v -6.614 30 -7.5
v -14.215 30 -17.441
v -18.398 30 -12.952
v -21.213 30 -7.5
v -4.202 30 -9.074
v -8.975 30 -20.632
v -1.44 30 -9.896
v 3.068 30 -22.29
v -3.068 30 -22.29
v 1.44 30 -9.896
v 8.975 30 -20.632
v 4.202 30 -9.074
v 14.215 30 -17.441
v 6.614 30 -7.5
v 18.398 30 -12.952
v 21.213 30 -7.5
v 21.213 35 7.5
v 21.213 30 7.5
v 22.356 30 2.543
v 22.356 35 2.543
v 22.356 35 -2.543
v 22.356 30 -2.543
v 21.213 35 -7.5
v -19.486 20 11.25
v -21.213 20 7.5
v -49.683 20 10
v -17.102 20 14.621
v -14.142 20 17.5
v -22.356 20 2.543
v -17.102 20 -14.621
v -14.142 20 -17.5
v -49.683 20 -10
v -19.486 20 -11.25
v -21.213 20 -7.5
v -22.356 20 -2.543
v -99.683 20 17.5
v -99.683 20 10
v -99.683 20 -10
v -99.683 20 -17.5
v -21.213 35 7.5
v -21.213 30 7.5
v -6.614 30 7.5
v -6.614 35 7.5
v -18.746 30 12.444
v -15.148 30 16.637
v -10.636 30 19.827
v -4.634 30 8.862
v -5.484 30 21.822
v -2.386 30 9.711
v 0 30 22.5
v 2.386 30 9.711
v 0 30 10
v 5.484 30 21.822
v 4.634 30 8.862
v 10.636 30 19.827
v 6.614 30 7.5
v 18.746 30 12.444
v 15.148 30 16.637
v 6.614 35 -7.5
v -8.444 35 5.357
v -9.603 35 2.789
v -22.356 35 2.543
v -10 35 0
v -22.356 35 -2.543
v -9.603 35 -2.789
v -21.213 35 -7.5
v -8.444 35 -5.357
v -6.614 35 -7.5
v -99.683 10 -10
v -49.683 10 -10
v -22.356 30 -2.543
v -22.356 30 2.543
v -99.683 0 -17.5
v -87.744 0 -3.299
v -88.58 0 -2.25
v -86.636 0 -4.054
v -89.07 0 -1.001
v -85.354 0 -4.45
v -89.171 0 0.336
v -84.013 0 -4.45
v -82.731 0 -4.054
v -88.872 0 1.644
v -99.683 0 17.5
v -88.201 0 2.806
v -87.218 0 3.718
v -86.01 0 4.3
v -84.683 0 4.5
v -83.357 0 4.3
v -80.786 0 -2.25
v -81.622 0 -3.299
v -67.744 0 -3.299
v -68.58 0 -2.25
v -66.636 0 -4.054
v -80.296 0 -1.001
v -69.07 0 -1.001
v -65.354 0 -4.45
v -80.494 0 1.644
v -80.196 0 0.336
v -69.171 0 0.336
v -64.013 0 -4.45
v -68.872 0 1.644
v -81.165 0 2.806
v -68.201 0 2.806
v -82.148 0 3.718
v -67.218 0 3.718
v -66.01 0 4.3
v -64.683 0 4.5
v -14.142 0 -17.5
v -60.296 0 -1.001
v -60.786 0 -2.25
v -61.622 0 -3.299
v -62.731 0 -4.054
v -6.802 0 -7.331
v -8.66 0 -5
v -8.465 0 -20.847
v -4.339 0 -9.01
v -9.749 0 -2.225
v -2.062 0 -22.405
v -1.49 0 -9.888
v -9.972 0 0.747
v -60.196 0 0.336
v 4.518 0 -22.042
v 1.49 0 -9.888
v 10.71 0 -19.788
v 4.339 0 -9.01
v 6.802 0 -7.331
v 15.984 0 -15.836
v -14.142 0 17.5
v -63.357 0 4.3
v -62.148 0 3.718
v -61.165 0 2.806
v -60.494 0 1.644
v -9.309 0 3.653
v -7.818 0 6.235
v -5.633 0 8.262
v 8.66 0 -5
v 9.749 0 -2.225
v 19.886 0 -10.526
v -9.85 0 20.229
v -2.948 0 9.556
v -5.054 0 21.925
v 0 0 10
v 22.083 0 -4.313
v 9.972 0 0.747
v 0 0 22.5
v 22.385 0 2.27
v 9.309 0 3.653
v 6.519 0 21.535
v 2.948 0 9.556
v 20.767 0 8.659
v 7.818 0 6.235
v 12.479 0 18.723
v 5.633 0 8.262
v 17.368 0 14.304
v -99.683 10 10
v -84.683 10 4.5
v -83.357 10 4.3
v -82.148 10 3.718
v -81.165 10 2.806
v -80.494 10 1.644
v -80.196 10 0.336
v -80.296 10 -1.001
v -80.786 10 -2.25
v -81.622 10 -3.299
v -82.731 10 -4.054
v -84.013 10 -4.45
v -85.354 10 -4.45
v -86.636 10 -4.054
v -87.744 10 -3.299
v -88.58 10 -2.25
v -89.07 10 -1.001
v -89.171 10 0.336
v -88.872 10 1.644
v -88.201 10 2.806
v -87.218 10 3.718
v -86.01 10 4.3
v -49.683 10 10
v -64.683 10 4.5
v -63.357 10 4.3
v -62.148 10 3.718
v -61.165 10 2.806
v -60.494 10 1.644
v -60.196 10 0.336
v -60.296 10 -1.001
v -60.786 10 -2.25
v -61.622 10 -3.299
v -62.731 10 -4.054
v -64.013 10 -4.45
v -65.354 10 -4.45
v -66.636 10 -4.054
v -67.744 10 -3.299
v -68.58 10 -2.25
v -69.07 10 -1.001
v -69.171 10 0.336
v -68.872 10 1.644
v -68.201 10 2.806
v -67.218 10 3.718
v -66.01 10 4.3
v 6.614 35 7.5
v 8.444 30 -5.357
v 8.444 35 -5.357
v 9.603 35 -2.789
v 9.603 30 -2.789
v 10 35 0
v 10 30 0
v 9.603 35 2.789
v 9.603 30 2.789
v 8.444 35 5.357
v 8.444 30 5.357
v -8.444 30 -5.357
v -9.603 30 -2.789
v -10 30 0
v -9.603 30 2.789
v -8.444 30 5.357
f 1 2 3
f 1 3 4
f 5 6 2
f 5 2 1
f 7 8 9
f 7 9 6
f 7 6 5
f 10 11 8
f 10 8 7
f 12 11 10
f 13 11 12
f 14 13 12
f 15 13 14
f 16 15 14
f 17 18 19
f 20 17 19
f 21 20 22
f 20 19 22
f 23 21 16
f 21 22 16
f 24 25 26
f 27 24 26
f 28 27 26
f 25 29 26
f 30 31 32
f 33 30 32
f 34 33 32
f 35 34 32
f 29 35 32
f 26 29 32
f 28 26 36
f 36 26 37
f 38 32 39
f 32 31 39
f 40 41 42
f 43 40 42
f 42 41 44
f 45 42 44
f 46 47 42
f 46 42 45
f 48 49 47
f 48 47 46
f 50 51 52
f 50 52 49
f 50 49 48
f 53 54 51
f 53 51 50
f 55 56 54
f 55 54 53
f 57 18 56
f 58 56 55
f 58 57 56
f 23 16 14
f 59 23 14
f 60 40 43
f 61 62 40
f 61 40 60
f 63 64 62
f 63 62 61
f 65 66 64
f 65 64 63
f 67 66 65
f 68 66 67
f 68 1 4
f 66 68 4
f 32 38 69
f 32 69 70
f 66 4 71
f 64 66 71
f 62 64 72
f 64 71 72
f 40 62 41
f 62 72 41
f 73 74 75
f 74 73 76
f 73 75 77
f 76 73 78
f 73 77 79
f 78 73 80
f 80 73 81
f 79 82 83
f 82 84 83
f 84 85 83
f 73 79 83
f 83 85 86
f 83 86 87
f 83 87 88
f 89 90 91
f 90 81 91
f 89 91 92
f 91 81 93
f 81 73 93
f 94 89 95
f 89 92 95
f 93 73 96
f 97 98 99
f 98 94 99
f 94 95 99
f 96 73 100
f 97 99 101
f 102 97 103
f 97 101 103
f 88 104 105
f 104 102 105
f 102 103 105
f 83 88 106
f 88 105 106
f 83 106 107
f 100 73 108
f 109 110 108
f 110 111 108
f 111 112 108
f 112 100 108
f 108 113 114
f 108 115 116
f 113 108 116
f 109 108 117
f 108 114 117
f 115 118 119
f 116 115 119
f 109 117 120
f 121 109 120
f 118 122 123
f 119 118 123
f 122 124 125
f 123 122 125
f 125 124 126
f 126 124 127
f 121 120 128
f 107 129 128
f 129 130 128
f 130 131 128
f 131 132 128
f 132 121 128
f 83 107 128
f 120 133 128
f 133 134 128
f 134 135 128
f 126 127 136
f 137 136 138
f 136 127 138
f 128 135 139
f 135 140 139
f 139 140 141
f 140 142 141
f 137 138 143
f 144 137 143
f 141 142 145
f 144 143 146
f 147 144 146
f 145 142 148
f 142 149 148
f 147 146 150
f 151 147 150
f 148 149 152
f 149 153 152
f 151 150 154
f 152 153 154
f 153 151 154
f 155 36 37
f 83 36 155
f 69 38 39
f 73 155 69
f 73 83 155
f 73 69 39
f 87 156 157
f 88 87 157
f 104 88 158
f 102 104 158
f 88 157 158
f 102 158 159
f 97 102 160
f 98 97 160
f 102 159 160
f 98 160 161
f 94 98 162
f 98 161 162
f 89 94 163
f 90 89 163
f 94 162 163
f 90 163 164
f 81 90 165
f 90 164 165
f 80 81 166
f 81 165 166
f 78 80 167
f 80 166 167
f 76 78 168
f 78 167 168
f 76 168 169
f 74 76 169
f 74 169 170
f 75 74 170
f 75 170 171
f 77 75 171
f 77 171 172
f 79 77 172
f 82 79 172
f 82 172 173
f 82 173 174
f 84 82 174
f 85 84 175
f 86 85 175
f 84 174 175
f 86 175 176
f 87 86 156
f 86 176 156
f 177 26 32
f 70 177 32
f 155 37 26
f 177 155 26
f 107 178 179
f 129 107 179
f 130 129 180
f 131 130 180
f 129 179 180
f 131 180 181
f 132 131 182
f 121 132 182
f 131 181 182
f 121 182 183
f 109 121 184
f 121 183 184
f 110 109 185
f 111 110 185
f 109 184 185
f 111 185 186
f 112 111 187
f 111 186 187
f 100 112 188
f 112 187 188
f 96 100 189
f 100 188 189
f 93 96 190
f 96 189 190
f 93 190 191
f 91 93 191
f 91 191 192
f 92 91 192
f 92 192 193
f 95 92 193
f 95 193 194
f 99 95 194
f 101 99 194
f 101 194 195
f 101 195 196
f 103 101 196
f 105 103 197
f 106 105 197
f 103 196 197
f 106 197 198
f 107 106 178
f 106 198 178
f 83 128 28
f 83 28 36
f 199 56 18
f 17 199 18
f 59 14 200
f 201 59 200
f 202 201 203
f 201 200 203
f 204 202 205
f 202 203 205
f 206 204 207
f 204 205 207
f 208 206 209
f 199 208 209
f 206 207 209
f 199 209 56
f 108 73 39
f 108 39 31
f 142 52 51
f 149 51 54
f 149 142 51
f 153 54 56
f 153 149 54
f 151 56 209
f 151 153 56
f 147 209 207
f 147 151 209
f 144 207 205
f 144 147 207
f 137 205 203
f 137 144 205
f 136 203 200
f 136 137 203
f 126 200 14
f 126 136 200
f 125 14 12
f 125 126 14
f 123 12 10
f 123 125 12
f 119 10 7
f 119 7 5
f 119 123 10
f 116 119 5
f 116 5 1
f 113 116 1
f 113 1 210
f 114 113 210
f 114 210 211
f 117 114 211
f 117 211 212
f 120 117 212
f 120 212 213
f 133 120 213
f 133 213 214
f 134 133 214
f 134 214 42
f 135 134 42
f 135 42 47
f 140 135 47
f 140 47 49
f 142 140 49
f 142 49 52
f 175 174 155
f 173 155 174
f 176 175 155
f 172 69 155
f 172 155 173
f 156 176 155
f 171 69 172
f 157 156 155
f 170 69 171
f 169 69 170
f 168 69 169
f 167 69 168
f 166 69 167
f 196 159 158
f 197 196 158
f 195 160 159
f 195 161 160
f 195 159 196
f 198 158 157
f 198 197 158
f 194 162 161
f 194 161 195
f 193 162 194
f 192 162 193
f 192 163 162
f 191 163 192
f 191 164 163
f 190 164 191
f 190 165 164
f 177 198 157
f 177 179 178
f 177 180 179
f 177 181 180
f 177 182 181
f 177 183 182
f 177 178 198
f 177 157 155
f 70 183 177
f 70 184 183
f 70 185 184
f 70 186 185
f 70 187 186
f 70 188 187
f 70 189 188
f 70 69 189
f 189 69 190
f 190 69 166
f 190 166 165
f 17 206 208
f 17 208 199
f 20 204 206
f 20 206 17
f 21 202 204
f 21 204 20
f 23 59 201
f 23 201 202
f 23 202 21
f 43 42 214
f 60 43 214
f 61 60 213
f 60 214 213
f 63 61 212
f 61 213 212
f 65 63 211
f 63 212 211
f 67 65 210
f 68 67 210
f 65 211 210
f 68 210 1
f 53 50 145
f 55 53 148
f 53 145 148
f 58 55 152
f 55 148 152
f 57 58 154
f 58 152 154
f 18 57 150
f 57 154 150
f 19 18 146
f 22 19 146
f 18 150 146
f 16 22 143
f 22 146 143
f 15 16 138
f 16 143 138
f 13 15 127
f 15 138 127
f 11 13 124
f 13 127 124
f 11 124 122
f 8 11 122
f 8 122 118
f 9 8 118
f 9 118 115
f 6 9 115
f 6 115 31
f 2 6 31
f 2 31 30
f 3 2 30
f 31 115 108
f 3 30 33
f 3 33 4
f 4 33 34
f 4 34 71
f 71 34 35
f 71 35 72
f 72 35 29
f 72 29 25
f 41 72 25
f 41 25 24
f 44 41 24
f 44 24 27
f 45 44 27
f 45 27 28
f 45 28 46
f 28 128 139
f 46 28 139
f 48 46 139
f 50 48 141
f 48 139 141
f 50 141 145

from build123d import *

# Parameters (mm, degrees)
IZIM1_R                     = 22.5
IZIM1_R_2                   = 10
Y_KSEKLIK_EKSTR_ZYON1_DEPTH = 30
Y_KSEKLIK_EKSTR_ZYON2_DEPTH = 5
Y_KSEKLIK_EKSTR_ZYON3_DEPTH = 20
IZIM4_W                     = 50
IZIM4_H                     = 20
KES_EKSTR_ZYON1_DEPTH       = 10
IZIM5_R                     = 4.5
KES_EKSTR_ZYON2_DEPTH       = 10


with BuildPart() as part:
    # Çizim1 → Yükseklik-Ekstrüzyon1 (new body)
    with BuildSketch(Plane(origin=(0, 0, 0), x_dir=(1, 0, 0), z_dir=(0, 1, 0))):
        with Locations(Location((0, 0, 0), (0, 0, 270))):
            Circle(IZIM1_R)
        with Locations(Location((0, 0, 0), (0, 0, 270))):
            Circle(IZIM1_R_2, mode=Mode.SUBTRACT)
    extrude(amount=Y_KSEKLIK_EKSTR_ZYON1_DEPTH)

    # Çizim2 → Yükseklik-Ekstrüzyon2 (add)
    with BuildSketch(Plane(origin=(0, 30, 0), x_dir=(1, 0, 0), z_dir=(0, 1, 0))):
        with BuildLine():
            Line((-6.614378278, 7.5), (-21.213203436, 7.5))
            ThreePointArc((-21.213203436, 7.5), (-22.5, 0), (-21.213203436, -7.5))
            Line((-21.213203436, -7.5), (-6.614378278, -7.5))
            ThreePointArc((-6.614378278, -7.5), (-10, 0), (-6.614378278, 7.5))
        make_face()
        with BuildLine():
            Line((21.213203436, 7.5), (6.614378278, 7.5))
            ThreePointArc((6.614378278, 7.5), (10, 0), (6.614378278, -7.5))
            Line((6.614378278, -7.5), (21.213203436, -7.5))
            ThreePointArc((21.213203436, -7.5), (22.5, 0), (21.213203436, 7.5))
        make_face()
    extrude(amount=Y_KSEKLIK_EKSTR_ZYON2_DEPTH)

    # Çizim3 → Yükseklik-Ekstrüzyon3 (add)
    with BuildSketch(Plane(origin=(0, 0, 0), x_dir=(1, 0, 0), z_dir=(0, 1, 0))):
        with BuildLine():
            Line((-14.142135624, -17.5), (-99.683227017, -17.5))
            Line((-99.683227017, -17.5), (-99.683227017, 17.5))
            Line((-99.683227017, 17.5), (-14.142135624, 17.5))
            ThreePointArc((-14.142135624, 17.5), (-18.371173071, 12.990381057), (-21.213203436, 7.5))
            ThreePointArc((-21.213203436, 7.5), (-22.5, 0), (-21.213203436, -7.5))
            ThreePointArc((-21.213203436, -7.5), (-18.371173071, -12.990381057), (-14.142135624, -17.5))
        make_face()
    extrude(amount=Y_KSEKLIK_EKSTR_ZYON3_DEPTH)

    # Çizim4 → Kes-Ekstrüzyon1 (cut)
    with BuildSketch(Plane(origin=(0, 20, 0), x_dir=(1, 0, 0), z_dir=(0, 1, 0))):
        with Locations((-74.683227017, 0)):
            Rectangle(IZIM4_W, IZIM4_H)
    extrude(amount=-KES_EKSTR_ZYON1_DEPTH, mode=Mode.SUBTRACT)

    # Çizim5 → Kes-Ekstrüzyon2 (cut)
    with BuildSketch(Plane(origin=(0, 10, 0), x_dir=(1, 0, 0), z_dir=(0, 1, 0))):
        with Locations(Location((-84.683227017, 0, 0), (0, 0, 270))):
            Circle(IZIM5_R)
        with Locations(Location((-64.683227017, 0, 0), (0, 0, 270))):
            Circle(IZIM5_R)
    extrude(amount=-KES_EKSTR_ZYON2_DEPTH, mode=Mode.SUBTRACT)


solid = part.part
